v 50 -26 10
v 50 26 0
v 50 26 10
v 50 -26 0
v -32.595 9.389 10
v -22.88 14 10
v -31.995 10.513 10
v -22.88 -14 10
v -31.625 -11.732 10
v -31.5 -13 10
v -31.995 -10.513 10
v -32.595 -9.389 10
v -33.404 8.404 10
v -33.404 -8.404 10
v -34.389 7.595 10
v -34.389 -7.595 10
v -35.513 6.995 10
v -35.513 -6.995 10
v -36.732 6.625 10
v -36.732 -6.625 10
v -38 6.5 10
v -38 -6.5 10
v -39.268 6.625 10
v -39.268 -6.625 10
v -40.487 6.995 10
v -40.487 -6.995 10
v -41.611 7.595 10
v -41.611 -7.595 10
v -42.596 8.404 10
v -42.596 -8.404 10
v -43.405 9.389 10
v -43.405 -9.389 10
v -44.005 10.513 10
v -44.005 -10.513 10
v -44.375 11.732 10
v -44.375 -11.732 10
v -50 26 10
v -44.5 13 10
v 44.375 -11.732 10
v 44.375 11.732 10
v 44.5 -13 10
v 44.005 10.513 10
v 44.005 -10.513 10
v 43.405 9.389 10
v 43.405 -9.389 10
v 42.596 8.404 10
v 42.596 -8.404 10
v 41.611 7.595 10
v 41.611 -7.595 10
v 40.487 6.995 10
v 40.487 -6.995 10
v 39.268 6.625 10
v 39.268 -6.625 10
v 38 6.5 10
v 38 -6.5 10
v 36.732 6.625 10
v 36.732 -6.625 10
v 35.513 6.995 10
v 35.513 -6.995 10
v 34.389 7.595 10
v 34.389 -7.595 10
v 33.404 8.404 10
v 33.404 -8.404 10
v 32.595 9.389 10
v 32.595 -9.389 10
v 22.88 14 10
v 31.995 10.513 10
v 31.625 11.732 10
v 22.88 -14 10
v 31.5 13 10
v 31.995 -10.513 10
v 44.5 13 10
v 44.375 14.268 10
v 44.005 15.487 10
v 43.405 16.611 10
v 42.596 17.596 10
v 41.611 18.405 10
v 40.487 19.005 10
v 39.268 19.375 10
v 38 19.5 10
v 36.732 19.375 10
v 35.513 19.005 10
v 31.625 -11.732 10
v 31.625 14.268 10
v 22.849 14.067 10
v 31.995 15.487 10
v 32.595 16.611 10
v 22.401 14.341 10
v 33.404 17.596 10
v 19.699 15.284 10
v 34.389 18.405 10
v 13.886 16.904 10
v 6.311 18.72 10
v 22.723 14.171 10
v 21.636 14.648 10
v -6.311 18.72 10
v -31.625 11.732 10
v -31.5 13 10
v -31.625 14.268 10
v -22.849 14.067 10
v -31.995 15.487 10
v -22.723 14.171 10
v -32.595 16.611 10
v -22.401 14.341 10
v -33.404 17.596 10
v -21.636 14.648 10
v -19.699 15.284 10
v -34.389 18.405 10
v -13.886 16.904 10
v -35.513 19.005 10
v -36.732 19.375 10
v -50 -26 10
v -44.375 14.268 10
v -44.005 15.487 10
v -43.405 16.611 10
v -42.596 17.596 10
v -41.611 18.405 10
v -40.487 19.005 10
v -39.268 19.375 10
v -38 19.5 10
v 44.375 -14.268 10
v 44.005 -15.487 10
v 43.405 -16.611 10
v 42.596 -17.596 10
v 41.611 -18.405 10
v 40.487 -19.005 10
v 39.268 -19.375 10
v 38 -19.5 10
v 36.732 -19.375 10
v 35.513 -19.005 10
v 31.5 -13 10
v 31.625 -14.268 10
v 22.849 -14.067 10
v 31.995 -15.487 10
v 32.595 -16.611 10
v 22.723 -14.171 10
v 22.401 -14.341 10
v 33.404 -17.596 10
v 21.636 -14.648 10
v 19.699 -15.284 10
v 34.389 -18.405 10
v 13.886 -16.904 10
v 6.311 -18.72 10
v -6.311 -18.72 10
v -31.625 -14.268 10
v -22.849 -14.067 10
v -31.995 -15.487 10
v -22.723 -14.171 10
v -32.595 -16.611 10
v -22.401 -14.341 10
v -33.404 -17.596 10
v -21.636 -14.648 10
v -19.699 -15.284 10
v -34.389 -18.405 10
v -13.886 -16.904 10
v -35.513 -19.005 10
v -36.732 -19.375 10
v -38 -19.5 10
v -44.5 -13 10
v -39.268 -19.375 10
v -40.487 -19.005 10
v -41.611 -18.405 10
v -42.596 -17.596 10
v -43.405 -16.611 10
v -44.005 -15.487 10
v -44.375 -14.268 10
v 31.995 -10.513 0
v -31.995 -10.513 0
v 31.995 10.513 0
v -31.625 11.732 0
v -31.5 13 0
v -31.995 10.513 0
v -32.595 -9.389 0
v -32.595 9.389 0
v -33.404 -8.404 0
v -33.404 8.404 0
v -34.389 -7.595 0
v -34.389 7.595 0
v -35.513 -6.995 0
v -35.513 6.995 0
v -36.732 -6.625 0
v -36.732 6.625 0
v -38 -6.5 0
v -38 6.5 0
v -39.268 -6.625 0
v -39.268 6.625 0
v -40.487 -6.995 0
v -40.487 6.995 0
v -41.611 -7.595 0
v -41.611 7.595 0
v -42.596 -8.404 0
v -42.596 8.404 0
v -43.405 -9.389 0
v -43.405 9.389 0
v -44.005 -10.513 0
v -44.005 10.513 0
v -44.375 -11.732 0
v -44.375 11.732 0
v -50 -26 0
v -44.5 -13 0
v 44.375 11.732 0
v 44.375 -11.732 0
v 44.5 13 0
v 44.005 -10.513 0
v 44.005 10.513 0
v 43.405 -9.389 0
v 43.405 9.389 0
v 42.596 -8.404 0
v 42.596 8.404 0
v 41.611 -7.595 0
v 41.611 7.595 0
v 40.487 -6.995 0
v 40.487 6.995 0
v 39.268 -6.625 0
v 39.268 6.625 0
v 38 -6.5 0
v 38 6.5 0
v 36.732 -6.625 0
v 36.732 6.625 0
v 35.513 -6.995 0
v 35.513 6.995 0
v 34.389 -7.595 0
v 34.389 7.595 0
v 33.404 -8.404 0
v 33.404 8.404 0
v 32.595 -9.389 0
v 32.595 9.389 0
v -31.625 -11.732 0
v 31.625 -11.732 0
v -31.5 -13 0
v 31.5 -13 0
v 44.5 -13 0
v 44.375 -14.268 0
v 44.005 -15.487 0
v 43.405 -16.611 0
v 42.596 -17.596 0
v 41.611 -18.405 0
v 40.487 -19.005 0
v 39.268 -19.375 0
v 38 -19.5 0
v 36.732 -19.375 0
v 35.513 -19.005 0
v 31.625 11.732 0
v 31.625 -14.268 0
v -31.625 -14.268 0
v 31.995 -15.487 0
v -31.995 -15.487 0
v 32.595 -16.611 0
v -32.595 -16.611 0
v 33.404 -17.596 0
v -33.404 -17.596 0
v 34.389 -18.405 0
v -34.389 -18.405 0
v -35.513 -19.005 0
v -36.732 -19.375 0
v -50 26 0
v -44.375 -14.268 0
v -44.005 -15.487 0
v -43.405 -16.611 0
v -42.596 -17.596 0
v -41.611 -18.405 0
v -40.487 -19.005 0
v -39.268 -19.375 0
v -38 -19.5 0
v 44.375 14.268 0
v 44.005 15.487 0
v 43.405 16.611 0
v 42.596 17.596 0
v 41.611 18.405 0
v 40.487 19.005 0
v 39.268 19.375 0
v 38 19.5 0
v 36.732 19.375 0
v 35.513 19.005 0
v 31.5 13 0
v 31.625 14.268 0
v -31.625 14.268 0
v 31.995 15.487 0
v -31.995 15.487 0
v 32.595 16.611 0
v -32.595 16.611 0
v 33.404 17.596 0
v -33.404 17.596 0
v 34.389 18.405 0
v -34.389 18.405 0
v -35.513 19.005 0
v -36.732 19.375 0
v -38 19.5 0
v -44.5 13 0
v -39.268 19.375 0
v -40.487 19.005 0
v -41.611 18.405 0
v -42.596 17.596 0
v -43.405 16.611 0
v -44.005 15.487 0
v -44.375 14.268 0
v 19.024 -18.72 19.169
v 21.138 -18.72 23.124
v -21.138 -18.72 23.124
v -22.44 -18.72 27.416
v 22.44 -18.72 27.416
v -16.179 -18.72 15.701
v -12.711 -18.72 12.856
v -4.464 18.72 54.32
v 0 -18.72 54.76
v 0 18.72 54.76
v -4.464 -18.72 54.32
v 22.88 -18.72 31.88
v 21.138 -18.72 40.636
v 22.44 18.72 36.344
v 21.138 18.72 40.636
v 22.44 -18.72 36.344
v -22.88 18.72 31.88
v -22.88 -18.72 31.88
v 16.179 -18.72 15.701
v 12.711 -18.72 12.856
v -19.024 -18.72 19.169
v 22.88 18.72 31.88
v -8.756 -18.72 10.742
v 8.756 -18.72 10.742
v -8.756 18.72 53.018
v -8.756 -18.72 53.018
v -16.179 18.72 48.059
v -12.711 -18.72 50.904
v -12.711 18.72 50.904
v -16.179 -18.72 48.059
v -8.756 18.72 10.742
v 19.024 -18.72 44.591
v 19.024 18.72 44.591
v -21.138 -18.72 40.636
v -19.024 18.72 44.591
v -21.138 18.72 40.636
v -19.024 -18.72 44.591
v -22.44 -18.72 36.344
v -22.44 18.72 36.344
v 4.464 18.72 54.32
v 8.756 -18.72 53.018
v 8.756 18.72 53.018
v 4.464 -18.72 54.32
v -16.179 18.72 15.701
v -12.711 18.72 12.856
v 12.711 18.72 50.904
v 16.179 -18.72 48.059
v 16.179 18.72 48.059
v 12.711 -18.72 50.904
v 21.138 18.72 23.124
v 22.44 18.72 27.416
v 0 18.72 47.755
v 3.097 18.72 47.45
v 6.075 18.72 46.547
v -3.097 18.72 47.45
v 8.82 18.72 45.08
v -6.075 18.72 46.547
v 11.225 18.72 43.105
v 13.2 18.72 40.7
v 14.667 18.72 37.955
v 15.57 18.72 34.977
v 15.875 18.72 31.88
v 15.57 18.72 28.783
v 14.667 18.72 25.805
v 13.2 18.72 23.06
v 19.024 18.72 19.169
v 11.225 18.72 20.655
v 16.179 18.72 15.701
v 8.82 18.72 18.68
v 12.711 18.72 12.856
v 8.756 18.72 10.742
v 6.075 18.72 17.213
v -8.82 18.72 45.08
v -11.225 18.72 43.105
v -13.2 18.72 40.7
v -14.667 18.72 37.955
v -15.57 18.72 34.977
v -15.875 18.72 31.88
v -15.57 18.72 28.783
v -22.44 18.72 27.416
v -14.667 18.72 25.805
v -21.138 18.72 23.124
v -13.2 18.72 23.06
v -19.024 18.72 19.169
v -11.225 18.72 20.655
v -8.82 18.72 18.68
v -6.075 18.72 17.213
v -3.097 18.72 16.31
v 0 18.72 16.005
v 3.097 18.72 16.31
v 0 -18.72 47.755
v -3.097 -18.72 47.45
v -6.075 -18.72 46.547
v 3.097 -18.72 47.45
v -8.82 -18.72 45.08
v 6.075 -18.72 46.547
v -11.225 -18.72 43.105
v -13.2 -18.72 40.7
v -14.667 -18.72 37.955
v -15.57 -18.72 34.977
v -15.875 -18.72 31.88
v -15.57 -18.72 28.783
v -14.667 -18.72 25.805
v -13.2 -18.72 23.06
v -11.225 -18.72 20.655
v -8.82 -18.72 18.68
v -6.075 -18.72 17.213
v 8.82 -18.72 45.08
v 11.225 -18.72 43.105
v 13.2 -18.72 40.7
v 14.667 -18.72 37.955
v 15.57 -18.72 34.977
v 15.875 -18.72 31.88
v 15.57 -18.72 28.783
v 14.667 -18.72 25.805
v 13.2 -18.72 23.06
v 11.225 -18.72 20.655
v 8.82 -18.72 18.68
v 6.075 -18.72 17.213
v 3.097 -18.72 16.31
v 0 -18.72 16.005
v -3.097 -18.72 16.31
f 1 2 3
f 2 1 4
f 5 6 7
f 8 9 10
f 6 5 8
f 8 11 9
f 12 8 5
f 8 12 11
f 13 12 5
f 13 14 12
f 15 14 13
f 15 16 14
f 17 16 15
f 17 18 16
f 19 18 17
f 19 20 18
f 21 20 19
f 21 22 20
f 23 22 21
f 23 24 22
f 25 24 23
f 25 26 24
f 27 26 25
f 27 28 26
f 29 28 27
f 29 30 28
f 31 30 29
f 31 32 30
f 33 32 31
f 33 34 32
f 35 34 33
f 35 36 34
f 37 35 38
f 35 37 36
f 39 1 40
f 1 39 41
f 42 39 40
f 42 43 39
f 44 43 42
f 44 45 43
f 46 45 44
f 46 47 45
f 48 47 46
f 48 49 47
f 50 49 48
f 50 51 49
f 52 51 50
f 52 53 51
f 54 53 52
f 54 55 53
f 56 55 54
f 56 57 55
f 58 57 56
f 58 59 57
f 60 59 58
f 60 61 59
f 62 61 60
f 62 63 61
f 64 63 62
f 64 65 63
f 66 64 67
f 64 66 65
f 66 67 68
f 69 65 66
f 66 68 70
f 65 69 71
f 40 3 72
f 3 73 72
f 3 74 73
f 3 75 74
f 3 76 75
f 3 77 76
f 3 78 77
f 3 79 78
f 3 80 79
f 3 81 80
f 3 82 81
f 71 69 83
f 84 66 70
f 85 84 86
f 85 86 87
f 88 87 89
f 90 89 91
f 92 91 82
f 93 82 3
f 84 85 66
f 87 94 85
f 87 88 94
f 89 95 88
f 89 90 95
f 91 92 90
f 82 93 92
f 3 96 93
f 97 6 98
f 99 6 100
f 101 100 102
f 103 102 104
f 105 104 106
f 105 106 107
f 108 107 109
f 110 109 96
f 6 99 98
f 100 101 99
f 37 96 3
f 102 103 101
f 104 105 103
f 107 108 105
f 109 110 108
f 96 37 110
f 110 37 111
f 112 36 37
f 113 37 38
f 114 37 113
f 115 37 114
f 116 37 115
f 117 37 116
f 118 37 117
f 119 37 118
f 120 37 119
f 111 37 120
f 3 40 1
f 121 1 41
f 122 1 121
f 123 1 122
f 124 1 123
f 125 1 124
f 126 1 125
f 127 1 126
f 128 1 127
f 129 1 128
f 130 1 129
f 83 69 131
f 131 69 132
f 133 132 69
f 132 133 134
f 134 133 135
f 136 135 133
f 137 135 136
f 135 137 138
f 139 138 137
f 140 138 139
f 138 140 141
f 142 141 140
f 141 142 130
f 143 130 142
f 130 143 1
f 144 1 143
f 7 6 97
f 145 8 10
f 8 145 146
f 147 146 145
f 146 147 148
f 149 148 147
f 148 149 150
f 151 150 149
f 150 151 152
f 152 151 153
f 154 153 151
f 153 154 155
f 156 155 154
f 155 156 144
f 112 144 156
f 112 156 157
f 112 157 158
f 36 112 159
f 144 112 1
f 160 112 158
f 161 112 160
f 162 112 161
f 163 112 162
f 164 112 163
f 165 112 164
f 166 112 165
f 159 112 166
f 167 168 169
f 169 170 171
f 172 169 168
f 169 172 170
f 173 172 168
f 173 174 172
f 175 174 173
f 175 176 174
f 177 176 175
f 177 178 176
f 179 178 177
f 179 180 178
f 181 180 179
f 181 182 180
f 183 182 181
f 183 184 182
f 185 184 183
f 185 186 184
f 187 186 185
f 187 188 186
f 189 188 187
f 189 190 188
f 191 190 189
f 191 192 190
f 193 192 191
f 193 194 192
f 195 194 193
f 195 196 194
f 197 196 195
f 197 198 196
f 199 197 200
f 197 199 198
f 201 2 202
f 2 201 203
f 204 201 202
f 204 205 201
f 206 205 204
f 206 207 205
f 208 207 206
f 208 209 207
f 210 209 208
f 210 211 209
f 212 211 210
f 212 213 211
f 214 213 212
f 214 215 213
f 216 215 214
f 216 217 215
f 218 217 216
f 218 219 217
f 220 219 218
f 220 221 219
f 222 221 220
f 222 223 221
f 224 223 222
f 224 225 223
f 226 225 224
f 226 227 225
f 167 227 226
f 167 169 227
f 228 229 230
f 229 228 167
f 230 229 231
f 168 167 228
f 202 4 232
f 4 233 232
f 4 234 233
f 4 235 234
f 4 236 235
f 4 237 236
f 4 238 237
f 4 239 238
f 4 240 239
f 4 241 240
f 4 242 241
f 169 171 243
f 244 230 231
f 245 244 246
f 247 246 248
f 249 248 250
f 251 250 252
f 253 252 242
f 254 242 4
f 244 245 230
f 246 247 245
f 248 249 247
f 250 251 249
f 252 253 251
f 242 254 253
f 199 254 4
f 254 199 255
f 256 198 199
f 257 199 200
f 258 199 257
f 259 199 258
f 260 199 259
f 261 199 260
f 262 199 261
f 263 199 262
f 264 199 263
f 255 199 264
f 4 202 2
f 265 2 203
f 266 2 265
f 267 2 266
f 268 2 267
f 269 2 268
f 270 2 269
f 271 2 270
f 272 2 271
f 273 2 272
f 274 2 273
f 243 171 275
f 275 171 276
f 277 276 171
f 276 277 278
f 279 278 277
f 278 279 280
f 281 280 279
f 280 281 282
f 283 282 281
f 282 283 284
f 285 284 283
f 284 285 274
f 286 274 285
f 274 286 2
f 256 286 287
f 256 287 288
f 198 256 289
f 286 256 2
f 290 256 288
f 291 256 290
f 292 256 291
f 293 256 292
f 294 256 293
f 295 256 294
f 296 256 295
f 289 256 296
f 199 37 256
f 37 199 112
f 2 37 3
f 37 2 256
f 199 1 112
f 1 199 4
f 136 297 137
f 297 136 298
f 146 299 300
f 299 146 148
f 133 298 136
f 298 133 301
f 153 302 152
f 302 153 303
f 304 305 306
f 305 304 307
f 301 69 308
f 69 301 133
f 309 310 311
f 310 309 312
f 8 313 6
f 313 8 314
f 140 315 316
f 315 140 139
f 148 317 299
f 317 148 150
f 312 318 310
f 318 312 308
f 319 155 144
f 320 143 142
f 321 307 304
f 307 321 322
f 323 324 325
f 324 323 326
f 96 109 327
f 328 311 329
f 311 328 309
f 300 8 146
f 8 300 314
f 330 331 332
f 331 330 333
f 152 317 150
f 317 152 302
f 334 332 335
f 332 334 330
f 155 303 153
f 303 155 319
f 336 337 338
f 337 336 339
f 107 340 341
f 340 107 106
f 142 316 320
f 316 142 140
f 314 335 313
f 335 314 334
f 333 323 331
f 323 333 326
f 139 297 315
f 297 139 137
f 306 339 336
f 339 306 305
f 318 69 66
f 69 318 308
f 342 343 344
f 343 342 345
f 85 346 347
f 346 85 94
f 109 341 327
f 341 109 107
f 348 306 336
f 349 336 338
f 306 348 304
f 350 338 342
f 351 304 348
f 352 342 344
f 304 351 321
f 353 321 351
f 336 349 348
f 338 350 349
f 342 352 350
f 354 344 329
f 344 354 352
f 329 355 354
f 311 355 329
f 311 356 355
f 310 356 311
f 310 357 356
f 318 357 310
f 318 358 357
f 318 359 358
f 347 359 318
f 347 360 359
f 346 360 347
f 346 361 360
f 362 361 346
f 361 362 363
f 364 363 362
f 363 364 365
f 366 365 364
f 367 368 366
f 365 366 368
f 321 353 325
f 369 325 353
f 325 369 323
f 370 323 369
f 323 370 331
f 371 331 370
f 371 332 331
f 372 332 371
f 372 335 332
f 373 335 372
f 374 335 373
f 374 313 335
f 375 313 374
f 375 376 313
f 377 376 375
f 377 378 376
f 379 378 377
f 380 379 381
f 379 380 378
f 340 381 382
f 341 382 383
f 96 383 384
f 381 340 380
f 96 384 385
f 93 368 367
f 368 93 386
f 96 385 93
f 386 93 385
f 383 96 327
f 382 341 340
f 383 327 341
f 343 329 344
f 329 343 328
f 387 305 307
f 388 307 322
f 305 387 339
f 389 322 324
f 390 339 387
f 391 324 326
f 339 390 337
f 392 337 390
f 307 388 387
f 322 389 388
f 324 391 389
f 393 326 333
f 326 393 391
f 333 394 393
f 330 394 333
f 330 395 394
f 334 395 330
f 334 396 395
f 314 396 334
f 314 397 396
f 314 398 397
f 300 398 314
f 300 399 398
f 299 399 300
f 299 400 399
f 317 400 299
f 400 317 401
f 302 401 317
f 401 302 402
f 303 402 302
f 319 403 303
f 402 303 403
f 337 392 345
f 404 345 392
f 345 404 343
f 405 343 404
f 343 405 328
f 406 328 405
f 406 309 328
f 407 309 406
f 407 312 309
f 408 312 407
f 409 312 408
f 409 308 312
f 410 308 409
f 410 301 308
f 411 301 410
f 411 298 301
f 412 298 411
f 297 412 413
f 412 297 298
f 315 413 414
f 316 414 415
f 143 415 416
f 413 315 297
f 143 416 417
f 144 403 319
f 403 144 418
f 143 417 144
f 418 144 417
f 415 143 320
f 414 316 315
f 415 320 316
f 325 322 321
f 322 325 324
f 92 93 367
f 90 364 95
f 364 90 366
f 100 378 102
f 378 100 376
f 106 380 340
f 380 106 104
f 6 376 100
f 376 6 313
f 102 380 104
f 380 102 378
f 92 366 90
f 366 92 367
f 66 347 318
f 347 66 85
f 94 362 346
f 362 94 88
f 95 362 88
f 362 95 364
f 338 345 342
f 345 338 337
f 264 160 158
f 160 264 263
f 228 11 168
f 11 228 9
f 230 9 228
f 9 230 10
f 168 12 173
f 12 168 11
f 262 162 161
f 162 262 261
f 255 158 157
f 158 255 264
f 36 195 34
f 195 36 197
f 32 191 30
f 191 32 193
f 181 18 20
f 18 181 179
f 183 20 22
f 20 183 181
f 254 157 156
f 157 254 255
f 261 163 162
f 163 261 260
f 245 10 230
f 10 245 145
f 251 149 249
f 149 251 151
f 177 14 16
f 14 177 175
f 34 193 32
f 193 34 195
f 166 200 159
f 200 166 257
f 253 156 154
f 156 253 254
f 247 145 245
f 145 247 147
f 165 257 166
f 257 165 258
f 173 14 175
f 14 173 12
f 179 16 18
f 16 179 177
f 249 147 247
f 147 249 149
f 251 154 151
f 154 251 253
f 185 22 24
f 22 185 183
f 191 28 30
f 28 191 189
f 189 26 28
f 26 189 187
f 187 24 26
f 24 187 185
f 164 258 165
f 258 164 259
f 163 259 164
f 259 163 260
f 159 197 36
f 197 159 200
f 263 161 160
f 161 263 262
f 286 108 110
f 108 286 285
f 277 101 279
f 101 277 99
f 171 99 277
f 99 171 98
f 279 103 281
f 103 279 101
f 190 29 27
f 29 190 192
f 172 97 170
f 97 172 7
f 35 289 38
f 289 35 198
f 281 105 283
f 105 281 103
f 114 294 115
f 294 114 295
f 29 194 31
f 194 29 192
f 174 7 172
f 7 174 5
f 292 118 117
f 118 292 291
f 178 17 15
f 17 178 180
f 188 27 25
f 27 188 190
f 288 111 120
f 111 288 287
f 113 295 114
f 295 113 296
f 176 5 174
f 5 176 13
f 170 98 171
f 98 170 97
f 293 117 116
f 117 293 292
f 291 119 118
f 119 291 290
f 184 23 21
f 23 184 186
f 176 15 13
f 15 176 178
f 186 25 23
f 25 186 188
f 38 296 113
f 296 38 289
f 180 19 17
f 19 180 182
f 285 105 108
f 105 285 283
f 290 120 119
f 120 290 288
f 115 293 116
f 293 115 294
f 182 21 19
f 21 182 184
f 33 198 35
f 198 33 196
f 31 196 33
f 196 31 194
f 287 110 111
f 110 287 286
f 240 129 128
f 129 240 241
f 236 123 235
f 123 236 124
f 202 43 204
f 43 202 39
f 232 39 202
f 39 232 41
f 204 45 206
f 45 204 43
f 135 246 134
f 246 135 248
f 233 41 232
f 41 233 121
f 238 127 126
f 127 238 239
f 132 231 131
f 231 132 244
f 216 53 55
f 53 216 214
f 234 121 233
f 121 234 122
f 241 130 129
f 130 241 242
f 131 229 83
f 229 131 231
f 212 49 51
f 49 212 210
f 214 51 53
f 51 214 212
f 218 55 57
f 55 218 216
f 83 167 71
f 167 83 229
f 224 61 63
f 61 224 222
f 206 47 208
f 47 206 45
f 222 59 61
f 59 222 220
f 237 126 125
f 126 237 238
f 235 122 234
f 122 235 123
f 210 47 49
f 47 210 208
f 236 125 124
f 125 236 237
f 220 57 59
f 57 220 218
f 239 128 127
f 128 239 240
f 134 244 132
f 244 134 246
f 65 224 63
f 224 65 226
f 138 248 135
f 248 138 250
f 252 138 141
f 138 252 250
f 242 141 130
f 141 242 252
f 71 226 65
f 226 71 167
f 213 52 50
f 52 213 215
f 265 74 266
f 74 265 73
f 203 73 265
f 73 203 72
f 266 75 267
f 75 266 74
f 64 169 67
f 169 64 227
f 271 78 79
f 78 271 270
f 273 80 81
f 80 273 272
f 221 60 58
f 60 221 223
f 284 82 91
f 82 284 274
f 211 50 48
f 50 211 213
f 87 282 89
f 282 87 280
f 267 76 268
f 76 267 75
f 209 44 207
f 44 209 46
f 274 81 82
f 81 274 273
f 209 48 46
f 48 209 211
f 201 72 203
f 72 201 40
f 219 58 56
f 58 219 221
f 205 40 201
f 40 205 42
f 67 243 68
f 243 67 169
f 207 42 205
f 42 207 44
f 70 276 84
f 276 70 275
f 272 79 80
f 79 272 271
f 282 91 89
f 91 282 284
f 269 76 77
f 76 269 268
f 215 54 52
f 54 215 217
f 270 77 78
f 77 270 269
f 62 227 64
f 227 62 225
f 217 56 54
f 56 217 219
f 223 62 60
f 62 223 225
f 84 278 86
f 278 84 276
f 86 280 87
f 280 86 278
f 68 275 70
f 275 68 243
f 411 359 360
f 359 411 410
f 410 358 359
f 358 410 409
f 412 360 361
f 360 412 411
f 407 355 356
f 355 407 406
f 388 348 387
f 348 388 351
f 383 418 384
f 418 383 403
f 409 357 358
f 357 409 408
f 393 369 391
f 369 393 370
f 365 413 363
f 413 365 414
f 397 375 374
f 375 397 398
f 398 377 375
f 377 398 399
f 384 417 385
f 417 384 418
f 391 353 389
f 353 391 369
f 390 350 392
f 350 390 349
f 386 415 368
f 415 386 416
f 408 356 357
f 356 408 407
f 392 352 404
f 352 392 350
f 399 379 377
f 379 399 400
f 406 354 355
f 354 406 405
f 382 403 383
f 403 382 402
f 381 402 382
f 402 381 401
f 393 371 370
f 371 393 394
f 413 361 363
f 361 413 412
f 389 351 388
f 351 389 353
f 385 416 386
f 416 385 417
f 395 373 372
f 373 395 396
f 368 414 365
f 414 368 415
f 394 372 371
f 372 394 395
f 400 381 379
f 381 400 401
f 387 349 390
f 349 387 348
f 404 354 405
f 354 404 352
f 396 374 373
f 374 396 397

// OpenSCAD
$fn = 32;

// ----------------------------------------------------------------------
// Bearing block: 100 x 52 mm base, 31.75 mm bore at 31.88 mm
// ----------------------------------------------------------------------

// --- parameters (mm) ---
base_w = 100;             // base width
base_d = 52;              // base depth
base_t = 10;              // base thickness
bore_d = 31.75;           // shaft / bearing bore
house_r = 22.88;          // housing outer radius
house_len = 37.44;        // housing length along the shaft
foot_w = 45.76;           // foot width under the housing
foot_len = 27.44;         // foot length along the shaft
axis_z = 31.88;           // bore axis height above the base
holes_d = 13;             // mounting holes
hole_x = 38;              // mounting hole spacing

difference() {
  union() {
    /* base plate with its underside on z = 0 */
    translate([0, 0, base_t / 2]) cube([base_w, base_d, base_t], center = true);
    /* hull foot: a straight web blending into the round housing */
    hull() {
      translate([0, 0, base_t - 0.5]) cube([foot_w, foot_len, 1.6], center = true);
      translate([0, 0, axis_z]) rotate([-90, 0, 0]) cylinder(h = house_len, d = 2 * house_r, center = true);
    }
  }
  /* bore through the housing, 2.5 mm clear on both sides */
  translate([0, 0, axis_z]) rotate([-90, 0, 0]) cylinder(h = house_len + 5, d = bore_d, center = true);
  /* mounting holes through the base plate */
  for (hx = [-38, 38]) {
    for (hy = [-13, 13]) {
      translate([hx, hy, -2.5]) cylinder(h = base_t + 5, d = holes_d);
    }
  }
}
